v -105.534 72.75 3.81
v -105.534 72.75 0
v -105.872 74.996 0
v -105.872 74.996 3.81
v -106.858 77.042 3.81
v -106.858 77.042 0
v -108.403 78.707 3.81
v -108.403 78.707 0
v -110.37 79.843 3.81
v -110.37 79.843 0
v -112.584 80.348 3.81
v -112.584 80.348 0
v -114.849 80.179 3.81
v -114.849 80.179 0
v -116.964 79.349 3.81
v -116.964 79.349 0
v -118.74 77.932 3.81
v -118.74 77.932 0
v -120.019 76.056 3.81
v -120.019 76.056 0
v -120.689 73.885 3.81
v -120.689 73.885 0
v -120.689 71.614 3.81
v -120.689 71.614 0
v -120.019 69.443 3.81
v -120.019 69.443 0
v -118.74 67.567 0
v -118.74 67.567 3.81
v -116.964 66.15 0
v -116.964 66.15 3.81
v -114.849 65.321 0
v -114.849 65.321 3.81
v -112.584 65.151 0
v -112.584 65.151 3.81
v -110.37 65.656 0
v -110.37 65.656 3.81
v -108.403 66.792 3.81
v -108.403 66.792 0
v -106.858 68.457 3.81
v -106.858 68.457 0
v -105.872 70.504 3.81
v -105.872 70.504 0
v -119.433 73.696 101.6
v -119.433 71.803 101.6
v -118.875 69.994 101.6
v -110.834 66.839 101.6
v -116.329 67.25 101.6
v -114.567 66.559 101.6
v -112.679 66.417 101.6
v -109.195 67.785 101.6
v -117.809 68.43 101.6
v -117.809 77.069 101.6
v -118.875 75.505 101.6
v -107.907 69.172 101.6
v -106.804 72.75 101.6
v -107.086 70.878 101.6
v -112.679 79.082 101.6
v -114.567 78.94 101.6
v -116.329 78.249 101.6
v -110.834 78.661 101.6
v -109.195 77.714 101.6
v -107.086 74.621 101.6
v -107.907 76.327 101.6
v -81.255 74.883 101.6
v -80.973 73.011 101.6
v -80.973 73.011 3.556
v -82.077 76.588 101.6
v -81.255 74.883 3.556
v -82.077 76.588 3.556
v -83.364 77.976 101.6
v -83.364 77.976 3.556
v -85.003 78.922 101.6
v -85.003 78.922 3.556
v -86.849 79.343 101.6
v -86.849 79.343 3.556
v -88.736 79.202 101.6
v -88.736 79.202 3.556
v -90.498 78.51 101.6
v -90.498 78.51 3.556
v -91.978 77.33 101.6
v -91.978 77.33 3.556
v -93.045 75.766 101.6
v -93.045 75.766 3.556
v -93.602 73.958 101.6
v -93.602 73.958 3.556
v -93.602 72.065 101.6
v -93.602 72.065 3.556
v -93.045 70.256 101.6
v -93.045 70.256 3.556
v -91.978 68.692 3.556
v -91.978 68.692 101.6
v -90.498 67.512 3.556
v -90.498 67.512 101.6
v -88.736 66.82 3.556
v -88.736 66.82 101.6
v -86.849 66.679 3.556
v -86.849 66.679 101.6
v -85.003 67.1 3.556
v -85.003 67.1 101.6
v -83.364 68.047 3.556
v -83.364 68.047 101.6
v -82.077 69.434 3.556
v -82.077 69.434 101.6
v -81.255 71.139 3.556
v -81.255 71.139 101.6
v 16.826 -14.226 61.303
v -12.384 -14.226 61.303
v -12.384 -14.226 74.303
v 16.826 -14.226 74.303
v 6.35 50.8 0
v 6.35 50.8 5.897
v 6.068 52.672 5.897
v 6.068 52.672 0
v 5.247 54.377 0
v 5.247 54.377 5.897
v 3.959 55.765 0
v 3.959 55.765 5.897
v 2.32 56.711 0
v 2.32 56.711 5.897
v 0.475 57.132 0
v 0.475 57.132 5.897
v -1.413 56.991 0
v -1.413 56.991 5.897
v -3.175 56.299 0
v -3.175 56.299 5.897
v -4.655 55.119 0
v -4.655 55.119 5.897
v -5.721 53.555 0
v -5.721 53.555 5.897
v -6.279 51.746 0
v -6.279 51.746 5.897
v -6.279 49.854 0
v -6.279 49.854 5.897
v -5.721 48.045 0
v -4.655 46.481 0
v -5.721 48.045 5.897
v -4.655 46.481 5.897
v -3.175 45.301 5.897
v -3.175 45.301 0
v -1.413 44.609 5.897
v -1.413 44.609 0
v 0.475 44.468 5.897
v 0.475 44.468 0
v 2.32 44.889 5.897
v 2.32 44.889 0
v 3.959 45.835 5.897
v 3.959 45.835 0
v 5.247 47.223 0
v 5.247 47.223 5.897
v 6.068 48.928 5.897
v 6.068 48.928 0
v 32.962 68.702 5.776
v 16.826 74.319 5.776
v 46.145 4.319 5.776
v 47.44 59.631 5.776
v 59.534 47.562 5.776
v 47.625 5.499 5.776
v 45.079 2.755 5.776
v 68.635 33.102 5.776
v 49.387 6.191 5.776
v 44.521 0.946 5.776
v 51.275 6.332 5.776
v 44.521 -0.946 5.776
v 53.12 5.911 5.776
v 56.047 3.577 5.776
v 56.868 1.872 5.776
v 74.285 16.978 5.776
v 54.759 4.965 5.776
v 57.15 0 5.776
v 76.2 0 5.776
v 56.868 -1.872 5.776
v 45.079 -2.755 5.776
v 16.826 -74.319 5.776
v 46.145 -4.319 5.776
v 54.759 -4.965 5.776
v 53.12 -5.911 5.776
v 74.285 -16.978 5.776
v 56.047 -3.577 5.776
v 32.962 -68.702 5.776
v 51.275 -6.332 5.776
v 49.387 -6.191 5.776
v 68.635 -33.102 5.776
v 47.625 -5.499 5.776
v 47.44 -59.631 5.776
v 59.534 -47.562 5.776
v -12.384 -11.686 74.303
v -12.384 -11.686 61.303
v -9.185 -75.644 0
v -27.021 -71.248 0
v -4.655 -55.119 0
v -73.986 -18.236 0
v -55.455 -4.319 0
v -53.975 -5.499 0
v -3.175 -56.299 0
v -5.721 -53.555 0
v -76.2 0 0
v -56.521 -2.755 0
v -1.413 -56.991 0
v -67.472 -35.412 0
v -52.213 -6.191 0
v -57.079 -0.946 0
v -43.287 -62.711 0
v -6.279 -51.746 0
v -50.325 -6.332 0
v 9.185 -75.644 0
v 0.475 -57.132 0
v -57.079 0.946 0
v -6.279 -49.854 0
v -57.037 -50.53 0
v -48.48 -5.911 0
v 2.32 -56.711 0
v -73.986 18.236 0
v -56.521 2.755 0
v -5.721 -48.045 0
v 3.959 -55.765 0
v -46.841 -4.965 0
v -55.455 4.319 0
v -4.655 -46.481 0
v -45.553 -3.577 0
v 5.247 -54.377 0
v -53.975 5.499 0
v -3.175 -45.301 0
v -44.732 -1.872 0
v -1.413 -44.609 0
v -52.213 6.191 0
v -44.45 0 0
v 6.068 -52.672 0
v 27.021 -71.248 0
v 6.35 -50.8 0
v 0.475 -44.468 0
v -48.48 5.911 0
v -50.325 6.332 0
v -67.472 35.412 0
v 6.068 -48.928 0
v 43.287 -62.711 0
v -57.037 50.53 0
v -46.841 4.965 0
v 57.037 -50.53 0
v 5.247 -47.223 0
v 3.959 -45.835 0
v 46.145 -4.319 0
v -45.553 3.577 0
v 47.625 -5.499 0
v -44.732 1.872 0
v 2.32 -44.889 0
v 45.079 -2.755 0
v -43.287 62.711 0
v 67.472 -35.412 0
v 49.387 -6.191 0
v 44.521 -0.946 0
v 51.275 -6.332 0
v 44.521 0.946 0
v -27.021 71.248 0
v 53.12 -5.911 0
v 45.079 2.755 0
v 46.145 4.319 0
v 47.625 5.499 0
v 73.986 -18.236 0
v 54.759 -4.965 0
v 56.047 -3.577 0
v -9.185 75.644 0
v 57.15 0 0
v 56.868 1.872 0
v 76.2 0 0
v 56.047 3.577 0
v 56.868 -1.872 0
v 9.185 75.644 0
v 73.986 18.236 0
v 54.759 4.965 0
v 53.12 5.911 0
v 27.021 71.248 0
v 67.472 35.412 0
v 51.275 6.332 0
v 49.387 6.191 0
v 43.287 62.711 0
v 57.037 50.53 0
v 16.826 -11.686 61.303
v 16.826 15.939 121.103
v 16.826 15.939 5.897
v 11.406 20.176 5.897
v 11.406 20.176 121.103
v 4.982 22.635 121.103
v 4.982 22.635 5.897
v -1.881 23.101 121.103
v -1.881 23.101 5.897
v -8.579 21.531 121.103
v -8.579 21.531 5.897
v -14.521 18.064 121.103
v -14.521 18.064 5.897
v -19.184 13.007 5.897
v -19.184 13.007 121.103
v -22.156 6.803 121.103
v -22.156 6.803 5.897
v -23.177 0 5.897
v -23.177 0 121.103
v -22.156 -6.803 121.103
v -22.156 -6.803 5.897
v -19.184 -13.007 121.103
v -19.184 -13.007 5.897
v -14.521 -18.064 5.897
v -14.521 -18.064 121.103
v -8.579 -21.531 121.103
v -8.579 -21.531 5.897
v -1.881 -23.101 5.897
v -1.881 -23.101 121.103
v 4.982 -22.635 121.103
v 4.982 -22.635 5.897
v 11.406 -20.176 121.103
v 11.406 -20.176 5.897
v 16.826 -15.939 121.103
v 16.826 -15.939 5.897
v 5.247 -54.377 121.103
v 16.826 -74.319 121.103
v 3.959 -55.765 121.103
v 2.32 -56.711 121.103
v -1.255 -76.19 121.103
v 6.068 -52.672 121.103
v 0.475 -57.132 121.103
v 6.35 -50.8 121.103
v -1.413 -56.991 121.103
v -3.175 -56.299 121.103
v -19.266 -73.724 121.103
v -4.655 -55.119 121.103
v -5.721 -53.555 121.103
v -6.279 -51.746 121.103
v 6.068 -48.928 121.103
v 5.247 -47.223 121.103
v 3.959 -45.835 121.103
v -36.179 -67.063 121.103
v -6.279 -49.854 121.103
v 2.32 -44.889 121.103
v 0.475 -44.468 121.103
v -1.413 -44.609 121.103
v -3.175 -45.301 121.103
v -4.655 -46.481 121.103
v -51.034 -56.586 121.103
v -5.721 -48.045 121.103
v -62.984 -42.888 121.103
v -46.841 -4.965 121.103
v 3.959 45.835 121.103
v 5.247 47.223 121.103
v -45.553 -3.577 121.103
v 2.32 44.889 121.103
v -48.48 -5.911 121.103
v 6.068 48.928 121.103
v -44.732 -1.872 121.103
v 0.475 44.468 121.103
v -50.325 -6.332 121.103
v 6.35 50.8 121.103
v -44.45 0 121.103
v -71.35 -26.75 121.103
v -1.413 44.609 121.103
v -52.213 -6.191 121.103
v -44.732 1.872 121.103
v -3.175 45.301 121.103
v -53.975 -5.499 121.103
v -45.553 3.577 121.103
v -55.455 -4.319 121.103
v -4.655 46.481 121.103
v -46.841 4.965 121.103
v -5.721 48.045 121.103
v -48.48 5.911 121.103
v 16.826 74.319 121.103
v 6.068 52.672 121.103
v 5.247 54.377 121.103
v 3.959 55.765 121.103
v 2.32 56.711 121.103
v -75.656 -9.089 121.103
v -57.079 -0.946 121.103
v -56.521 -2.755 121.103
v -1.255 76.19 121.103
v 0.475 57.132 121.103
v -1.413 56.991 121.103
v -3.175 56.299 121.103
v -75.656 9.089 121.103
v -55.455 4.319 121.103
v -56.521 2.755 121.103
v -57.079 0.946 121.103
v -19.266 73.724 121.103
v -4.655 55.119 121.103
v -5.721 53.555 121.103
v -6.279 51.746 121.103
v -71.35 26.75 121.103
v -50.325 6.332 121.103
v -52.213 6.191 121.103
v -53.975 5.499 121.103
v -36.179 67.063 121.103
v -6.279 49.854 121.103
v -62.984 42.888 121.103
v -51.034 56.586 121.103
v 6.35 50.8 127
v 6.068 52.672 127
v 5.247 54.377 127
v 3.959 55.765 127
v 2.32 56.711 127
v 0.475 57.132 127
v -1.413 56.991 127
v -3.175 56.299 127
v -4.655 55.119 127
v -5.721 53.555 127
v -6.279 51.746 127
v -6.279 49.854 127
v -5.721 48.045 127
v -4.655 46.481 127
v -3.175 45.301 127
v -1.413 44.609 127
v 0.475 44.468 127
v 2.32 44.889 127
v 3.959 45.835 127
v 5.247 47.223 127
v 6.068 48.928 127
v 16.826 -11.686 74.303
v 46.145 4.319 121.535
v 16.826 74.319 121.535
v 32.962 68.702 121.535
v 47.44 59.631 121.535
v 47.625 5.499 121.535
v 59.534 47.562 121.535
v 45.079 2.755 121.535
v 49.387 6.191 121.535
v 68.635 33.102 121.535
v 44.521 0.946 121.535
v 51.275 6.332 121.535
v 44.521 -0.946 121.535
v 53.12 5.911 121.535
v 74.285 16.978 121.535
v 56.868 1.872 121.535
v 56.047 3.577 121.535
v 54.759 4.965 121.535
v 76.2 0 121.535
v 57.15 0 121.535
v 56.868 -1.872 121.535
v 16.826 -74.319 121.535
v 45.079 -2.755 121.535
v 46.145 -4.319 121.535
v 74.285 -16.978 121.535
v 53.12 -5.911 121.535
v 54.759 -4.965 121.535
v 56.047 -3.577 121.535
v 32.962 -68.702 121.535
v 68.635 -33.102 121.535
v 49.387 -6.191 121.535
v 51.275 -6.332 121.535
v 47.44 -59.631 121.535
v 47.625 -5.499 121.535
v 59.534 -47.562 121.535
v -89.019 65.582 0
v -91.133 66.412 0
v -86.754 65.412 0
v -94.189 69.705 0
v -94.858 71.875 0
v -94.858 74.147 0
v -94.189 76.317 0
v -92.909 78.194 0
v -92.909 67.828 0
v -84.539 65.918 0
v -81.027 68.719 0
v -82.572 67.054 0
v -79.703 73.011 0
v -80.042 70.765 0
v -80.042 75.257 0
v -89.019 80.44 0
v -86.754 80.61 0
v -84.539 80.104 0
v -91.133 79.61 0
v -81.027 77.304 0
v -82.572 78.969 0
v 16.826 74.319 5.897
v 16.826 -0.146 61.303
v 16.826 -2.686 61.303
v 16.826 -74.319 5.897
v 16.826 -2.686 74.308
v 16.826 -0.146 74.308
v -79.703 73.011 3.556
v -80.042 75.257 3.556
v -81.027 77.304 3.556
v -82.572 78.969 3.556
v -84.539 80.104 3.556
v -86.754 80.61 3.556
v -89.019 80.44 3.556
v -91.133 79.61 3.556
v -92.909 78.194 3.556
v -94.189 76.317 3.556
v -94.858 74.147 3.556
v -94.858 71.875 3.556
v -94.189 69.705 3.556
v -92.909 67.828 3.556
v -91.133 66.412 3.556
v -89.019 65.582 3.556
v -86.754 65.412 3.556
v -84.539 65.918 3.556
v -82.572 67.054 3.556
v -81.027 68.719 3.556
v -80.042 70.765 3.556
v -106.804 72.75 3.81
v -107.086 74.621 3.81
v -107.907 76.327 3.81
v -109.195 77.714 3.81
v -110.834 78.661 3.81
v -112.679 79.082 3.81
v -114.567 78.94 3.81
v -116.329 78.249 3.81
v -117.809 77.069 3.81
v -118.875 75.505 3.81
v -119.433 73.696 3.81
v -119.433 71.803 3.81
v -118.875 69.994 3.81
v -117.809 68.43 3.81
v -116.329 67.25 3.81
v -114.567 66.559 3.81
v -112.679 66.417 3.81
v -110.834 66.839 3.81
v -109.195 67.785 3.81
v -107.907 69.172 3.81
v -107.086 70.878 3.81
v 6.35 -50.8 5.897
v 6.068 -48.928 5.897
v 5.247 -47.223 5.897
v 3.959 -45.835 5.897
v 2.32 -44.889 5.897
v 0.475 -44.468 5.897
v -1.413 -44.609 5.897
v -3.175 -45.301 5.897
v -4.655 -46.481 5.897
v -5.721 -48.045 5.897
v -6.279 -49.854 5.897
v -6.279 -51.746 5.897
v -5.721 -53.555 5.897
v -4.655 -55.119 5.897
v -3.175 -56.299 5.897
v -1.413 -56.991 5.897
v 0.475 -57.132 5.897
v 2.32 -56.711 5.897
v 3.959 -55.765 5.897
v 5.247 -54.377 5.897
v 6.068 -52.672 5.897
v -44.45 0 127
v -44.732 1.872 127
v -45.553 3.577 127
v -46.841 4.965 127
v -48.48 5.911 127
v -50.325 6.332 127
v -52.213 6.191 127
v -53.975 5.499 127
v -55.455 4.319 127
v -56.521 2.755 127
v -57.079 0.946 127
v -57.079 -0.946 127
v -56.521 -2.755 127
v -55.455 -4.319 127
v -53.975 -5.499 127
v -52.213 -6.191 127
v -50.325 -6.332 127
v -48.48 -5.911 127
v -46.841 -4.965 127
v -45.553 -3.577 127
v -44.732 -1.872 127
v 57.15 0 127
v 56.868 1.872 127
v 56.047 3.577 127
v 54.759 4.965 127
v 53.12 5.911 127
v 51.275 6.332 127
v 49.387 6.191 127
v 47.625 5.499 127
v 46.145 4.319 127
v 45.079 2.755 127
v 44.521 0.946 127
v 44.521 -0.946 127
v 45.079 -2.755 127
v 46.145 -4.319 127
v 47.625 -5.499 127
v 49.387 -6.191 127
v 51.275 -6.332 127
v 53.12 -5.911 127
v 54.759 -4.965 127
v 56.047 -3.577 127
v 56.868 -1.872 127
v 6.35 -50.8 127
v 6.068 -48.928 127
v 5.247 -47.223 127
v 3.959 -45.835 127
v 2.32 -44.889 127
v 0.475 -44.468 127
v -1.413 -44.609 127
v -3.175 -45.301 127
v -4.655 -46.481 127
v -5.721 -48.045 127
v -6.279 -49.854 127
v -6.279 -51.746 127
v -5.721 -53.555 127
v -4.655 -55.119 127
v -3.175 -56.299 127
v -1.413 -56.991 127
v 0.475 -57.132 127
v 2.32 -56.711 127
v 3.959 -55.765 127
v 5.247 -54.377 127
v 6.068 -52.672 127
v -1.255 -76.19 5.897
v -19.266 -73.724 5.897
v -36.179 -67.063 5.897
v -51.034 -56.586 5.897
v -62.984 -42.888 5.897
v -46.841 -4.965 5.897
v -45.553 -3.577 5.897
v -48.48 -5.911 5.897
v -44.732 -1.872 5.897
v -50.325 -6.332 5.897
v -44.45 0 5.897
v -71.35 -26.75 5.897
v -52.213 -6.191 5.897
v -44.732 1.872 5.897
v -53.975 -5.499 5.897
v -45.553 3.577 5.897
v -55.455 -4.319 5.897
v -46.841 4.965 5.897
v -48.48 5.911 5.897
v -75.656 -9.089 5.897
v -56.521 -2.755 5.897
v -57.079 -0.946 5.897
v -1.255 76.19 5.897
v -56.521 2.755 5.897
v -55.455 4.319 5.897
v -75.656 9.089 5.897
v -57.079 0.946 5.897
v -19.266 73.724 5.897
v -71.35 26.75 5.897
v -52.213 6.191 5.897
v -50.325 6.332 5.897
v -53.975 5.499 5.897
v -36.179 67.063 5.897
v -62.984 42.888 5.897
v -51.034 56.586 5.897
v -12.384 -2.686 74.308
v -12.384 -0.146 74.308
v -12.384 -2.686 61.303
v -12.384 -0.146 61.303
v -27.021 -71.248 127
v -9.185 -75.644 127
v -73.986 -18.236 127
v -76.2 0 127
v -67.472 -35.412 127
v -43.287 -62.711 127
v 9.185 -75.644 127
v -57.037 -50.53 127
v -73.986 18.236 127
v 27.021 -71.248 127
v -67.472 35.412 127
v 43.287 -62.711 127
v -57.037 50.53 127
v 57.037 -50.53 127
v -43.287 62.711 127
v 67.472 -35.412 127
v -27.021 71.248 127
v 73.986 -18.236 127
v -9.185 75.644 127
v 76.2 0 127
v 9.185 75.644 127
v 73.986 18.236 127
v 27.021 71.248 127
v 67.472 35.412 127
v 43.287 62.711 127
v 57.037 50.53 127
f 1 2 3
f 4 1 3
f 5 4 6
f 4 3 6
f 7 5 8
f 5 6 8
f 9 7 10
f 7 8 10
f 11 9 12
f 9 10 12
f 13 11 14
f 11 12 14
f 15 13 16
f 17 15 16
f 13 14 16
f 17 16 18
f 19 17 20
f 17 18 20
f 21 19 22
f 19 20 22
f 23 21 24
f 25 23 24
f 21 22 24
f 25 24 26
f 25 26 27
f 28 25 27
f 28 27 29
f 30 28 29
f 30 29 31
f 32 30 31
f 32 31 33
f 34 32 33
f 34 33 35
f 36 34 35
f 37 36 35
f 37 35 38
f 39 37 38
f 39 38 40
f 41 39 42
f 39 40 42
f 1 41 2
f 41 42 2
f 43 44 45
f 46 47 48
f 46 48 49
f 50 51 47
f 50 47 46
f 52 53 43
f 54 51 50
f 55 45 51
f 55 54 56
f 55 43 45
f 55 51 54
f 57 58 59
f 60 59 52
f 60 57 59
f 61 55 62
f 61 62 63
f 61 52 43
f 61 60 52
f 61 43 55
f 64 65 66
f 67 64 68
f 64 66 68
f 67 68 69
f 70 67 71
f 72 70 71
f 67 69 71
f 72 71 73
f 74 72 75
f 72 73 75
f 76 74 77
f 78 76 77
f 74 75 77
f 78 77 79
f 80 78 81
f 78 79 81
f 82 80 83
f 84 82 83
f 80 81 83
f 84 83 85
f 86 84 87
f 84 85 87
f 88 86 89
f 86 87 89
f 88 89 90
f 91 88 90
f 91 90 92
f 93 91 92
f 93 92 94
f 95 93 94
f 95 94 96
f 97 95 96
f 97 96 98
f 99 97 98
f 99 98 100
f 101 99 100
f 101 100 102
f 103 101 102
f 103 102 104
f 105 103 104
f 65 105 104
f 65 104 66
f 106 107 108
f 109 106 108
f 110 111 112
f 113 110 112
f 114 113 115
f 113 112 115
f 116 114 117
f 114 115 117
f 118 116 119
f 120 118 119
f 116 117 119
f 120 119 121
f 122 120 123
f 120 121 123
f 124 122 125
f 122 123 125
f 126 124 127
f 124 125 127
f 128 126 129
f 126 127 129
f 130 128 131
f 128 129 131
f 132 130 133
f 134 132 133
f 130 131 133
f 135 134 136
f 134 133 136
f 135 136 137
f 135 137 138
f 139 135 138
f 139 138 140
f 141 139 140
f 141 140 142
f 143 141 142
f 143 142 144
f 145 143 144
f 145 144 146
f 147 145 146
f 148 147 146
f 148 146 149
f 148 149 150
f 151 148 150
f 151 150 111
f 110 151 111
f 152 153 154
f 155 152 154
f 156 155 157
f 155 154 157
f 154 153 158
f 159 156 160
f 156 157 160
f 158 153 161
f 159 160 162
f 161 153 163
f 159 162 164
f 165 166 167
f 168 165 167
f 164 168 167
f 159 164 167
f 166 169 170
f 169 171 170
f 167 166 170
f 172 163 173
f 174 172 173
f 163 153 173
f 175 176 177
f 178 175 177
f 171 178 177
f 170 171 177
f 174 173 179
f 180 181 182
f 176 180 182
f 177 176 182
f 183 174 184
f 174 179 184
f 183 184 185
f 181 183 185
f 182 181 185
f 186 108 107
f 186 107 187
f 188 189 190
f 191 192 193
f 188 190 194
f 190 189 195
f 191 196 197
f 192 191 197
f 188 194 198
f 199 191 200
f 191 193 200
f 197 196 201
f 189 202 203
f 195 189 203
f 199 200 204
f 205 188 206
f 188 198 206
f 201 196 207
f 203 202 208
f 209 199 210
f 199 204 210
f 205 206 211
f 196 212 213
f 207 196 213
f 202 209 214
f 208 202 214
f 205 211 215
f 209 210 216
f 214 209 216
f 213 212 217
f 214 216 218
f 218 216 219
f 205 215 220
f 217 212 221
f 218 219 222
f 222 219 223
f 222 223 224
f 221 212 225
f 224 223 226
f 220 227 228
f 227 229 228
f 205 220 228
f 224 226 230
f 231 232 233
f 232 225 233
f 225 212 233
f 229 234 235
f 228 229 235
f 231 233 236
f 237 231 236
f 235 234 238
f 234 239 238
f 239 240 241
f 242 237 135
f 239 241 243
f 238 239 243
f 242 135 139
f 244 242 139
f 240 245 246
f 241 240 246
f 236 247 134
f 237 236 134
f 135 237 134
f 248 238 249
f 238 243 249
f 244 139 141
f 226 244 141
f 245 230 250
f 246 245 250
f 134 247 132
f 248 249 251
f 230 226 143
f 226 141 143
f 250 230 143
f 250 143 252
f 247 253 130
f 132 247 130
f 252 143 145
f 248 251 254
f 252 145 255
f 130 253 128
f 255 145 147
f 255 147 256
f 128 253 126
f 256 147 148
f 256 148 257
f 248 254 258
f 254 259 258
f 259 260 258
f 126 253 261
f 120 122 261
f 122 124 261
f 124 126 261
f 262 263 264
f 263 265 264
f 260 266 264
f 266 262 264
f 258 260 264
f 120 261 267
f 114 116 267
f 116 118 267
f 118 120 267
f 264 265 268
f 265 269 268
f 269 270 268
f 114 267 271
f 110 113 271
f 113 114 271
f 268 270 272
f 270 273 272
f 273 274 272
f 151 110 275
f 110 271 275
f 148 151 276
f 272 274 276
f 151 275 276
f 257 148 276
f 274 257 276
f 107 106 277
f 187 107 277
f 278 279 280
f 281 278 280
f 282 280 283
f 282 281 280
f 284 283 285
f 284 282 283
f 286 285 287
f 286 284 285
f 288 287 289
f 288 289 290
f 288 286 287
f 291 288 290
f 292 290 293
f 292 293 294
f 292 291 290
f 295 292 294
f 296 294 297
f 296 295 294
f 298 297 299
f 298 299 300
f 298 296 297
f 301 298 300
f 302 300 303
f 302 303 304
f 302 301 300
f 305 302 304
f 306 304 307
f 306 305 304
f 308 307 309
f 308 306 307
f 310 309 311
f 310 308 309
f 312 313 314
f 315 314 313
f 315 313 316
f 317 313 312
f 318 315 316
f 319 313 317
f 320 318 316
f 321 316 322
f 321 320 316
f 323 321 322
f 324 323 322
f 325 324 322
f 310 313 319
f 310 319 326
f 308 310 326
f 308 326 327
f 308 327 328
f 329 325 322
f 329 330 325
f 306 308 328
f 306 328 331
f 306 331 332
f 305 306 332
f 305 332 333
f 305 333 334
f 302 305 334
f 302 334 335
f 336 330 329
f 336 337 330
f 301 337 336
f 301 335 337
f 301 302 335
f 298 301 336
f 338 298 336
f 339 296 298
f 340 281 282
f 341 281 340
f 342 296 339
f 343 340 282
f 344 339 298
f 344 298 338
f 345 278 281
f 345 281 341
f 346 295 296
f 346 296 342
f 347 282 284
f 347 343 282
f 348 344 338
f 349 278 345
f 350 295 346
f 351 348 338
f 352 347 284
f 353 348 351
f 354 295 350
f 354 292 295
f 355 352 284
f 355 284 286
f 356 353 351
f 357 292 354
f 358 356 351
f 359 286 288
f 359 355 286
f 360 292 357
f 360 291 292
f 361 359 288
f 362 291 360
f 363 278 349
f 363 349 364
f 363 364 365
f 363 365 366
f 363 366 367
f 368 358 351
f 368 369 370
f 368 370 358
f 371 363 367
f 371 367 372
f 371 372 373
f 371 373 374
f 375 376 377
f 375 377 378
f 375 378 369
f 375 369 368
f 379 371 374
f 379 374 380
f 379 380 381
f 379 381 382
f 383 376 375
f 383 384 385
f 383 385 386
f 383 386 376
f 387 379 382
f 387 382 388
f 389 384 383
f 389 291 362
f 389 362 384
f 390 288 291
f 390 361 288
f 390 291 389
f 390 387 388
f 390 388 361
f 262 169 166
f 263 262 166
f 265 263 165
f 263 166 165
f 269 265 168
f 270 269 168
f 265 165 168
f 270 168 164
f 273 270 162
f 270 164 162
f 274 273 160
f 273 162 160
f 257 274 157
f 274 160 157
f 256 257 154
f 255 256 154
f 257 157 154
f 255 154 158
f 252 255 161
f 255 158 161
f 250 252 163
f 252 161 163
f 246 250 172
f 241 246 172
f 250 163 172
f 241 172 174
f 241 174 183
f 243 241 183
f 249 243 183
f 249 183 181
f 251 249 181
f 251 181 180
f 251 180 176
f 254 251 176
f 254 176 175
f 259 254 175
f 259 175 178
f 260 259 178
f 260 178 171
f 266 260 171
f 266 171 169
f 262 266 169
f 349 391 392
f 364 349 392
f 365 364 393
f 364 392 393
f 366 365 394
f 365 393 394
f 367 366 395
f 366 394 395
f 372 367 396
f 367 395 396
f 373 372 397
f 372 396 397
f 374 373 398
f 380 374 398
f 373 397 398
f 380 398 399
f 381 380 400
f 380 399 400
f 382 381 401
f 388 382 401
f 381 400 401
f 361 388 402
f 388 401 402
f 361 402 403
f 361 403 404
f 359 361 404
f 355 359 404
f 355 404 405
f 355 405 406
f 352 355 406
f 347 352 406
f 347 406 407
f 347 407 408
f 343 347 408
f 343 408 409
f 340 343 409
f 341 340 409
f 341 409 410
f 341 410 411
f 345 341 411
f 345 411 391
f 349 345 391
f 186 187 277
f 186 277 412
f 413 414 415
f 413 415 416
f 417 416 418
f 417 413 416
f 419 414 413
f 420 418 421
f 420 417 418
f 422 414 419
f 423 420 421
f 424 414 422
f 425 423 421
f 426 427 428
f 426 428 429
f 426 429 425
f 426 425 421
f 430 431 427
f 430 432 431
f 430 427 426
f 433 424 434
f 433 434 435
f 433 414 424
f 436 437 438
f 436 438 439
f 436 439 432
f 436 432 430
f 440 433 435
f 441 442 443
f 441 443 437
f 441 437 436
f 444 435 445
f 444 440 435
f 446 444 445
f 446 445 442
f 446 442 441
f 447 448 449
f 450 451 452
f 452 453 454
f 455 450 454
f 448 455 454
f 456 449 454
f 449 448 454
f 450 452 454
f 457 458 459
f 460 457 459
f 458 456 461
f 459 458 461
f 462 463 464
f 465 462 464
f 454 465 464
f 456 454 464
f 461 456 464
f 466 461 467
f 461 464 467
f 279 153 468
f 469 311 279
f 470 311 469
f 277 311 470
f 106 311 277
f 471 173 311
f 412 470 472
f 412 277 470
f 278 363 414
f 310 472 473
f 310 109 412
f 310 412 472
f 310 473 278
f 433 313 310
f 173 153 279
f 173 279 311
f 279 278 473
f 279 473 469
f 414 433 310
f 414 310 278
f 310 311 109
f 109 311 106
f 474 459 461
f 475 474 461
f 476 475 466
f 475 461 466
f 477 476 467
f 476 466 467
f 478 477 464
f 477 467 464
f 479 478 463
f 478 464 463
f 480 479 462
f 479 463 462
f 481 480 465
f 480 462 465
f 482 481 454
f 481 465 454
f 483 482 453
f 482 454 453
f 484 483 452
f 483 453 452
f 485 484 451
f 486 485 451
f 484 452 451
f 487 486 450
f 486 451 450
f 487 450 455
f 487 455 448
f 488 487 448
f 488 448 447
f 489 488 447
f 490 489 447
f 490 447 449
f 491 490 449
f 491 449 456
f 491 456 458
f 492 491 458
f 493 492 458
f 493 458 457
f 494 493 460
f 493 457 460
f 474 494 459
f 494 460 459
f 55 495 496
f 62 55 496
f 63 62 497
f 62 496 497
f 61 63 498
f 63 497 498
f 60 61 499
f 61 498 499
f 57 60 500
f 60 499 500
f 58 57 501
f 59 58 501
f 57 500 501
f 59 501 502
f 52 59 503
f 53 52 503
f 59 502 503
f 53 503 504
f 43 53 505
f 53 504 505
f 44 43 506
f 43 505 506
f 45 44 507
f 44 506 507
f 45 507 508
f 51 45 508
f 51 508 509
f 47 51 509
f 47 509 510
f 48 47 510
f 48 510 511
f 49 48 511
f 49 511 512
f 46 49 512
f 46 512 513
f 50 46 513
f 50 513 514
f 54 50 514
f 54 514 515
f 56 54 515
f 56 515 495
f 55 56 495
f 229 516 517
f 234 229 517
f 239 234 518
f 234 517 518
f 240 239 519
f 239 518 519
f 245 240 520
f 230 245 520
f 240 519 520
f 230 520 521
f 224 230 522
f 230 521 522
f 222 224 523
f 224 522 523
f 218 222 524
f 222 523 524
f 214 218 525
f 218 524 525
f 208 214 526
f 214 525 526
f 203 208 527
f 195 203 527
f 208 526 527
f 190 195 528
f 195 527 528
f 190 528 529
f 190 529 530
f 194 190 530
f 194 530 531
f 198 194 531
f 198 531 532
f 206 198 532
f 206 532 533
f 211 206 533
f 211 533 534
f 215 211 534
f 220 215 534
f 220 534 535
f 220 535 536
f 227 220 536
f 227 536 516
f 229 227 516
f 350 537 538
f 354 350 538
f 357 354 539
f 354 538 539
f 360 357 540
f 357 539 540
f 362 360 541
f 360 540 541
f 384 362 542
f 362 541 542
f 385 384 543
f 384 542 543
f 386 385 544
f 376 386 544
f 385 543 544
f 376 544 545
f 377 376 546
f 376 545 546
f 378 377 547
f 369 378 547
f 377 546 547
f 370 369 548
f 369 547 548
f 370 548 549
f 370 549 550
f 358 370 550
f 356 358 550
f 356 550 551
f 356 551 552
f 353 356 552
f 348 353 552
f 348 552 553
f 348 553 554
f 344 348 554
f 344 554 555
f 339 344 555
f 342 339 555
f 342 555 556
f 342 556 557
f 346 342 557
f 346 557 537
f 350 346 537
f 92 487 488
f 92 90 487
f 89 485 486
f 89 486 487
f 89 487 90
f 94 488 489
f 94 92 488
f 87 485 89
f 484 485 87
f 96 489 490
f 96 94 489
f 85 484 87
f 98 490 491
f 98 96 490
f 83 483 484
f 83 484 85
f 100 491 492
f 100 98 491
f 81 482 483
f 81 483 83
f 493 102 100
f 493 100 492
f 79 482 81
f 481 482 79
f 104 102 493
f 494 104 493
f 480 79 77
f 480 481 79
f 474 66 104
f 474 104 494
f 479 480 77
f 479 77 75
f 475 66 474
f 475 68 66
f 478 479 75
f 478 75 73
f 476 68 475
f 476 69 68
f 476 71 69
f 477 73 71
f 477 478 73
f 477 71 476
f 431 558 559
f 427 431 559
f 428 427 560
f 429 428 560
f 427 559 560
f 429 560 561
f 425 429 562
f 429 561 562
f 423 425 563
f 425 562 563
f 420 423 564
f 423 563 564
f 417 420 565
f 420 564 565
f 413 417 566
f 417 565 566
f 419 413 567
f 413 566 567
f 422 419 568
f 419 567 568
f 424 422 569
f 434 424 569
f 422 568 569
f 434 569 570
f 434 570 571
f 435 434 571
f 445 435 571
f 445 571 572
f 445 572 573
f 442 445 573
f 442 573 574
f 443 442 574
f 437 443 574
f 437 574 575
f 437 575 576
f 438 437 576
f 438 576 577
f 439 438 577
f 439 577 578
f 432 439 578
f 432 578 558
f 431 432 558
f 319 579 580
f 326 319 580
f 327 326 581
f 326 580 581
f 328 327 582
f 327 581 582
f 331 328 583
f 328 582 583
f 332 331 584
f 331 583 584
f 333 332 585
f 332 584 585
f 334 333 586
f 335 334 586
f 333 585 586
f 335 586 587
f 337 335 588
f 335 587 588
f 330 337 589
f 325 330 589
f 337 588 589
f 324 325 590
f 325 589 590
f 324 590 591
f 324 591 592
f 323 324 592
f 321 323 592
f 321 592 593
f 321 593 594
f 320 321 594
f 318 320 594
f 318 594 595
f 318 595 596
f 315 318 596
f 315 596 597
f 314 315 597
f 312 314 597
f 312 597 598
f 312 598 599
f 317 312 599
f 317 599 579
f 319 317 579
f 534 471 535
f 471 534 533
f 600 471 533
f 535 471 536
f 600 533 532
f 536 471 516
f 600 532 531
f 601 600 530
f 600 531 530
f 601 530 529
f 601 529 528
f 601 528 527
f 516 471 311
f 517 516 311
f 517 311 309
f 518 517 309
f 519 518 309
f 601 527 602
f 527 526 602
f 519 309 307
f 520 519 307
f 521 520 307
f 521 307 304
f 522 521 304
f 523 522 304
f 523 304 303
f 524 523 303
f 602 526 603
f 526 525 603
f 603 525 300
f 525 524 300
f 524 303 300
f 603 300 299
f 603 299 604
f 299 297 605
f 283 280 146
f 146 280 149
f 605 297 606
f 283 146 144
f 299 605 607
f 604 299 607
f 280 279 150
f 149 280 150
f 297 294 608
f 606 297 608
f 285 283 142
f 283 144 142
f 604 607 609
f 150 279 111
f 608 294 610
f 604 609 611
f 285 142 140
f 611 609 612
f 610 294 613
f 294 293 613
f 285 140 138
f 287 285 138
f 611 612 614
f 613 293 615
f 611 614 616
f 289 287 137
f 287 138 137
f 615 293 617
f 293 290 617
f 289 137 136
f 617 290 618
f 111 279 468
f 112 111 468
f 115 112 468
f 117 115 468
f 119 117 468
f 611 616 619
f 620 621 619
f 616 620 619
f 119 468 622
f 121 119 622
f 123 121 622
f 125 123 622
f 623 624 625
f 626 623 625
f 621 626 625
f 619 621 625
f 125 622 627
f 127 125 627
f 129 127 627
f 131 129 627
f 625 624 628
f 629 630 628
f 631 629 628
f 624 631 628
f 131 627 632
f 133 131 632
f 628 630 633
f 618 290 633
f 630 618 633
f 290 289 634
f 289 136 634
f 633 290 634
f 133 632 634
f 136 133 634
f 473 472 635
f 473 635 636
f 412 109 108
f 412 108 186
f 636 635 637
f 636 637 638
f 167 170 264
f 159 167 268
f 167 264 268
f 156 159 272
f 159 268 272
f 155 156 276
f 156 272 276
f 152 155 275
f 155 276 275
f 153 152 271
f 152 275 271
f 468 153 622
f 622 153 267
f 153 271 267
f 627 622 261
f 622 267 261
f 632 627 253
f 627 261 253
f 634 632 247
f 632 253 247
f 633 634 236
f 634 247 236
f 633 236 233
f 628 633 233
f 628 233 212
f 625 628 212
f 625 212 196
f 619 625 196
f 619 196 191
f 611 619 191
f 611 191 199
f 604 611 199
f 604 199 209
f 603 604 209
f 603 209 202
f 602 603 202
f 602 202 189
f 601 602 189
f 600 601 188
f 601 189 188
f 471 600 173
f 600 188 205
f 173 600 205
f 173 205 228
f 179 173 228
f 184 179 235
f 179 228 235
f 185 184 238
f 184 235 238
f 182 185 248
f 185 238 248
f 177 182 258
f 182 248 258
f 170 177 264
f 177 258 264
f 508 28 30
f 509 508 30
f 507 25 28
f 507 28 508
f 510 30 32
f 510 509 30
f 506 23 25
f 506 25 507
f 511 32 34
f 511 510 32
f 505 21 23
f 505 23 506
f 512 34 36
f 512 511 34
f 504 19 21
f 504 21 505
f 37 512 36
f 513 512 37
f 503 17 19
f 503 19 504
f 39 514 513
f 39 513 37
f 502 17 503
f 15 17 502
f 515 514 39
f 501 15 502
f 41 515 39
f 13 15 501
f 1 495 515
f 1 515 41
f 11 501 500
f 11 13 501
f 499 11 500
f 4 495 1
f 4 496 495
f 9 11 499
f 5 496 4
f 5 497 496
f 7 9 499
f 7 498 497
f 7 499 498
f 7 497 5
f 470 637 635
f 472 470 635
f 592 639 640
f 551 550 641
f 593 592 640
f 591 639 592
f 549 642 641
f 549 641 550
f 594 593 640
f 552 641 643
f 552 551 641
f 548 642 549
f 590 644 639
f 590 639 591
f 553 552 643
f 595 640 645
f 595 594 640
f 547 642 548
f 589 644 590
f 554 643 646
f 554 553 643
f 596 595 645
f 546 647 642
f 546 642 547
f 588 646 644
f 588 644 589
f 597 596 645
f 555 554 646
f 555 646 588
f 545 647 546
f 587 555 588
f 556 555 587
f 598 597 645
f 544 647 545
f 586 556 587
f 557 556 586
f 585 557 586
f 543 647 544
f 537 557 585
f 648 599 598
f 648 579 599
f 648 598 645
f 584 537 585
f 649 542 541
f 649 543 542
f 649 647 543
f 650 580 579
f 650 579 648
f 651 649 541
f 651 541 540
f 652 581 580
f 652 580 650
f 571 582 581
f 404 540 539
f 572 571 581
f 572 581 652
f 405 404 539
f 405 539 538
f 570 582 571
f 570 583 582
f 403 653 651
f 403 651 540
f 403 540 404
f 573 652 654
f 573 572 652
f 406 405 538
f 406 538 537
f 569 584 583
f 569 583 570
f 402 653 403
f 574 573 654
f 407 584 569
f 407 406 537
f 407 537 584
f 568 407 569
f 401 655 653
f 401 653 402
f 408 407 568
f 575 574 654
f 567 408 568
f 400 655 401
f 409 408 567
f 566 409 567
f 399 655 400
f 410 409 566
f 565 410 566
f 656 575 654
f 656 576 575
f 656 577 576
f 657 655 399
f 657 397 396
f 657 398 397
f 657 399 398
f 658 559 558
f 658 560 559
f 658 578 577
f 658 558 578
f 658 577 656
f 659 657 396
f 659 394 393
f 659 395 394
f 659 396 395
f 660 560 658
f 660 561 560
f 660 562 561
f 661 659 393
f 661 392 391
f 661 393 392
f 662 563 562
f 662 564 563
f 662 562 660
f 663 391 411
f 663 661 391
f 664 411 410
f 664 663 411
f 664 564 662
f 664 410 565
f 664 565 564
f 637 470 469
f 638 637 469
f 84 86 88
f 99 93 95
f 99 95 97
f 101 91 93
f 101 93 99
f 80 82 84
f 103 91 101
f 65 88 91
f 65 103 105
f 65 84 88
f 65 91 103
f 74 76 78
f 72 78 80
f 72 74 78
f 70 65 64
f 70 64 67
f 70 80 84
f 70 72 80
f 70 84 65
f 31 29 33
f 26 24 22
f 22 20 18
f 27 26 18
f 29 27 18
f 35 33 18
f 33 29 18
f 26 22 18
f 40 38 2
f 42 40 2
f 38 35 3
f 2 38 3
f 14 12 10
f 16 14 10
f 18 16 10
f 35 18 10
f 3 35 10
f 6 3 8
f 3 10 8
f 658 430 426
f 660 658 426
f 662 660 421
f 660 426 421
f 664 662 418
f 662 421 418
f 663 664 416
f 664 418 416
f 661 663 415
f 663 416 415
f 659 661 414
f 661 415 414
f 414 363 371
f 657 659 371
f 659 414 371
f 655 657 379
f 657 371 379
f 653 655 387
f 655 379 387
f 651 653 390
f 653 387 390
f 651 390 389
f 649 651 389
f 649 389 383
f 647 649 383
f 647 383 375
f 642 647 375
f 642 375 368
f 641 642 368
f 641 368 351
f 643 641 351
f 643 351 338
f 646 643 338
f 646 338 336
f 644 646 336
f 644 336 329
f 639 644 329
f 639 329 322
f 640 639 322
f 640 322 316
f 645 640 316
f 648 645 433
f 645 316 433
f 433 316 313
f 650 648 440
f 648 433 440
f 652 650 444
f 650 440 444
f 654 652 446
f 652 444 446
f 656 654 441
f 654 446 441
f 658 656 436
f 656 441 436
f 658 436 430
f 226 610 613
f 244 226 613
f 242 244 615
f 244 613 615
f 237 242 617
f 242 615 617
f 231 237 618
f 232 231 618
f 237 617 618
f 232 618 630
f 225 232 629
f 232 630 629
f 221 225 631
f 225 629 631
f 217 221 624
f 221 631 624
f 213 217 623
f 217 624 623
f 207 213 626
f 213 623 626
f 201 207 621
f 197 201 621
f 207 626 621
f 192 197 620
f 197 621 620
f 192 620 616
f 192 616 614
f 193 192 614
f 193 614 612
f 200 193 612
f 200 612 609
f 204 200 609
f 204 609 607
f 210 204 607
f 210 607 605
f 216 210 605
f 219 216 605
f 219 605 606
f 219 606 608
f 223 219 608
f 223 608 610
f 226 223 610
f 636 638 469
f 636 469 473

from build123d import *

# Parameters (mm, degrees)
F0_R      = 76.2
F1_DEPTH  = 127
F2_W      = 76.145089
F2_H      = 115.205428
F4_R      = 6.35
F5_DEPTH  = 136.906
F6_R      = 7.62
F6_R_2    = 6.35
F7_DEPTH  = 3.81
F8_DEPTH  = 101.6
F9_R      = 7.62
F9_R_2    = 6.35
F10_DEPTH = 3.556
F11_DEPTH = 101.6
F12_W     = 117.167409
F12_H     = 115.758444
F13_DEPTH = 88.9
F14_W     = 2.54
F14_H     = 13
F14_H_2   = 13.0048
F15_DEPTH = 29.21


with BuildPart() as f1:
    # F0 (on Top) → F1 (new body)
    with BuildSketch(Plane.XY):
        Circle(F0_R)
    extrude(amount=F1_DEPTH)

    # F2 (on Front) → F3 (revolve, cut)
    with BuildSketch(Plane.XZ):
        with Locations((61.249767, 63.500029)):
            Rectangle(F2_W, F2_H)
    revolve(axis=Axis((0, 0, 3.061064), (0, 0, 1)), mode=Mode.SUBTRACT)

    # F4 (on face) → F5 (cut)
    with BuildSketch(Plane.XY.offset(127)):
        with Locations((0, 50.8)):
            Circle(F4_R)
        with Locations((50.8, 0)):
            Circle(F4_R)
        with Locations((-50.8, 0)):
            Circle(F4_R)
        with Locations((0, -50.8)):
            Circle(F4_R)
    extrude(amount=-F5_DEPTH, mode=Mode.SUBTRACT)

    # F12 (on Front) → F13 (cut, symmetric)
    with BuildSketch(Plane.XZ):
        with Locations((75.409816, 63.655438)):
            Rectangle(F12_W, F12_H)
    extrude(amount=F13_DEPTH, both=True, mode=Mode.SUBTRACT)

    # F14 (on face) → F15 (cut)
    with BuildSketch(Plane.YZ.offset(16.826112)):
        with Locations((-12.956317, 67.802921)):
            Rectangle(F14_W, F14_H)
        with Locations((-1.416317, 67.805321)):
            Rectangle(F14_W, F14_H_2)
    extrude(amount=-F15_DEPTH, mode=Mode.SUBTRACT)


with BuildPart() as f7:
    # F6 (on Top) → F7 (new body)
    with BuildSketch(Plane.XY):
        with Locations((-113.153763, 72.74957)):
            Circle(F6_R)
        with Locations((-113.153763, 72.74957)):
            Circle(F6_R_2, mode=Mode.SUBTRACT)
    extrude(amount=F7_DEPTH)

    # F6 (on Top) → F8 (join)
    with BuildSketch(Plane.XY):
        with Locations((-113.153763, 72.74957)):
            Circle(F6_R_2)
    extrude(amount=F8_DEPTH)


with BuildPart() as f10:
    # F9 (on Top) → F10 (new body)
    with BuildSketch(Plane.XY):
        with Locations((-87.323353, 73.011138)):
            Circle(F9_R)
        with Locations((-87.323353, 73.011138)):
            Circle(F9_R_2, mode=Mode.SUBTRACT)
    extrude(amount=F10_DEPTH)

    # F9 (on Top) → F11 (join)
    with BuildSketch(Plane.XY):
        with Locations((-87.323353, 73.011138)):
            Circle(F9_R_2)
    extrude(amount=F11_DEPTH)


solid = Compound([f1.part, f7.part, f10.part])
